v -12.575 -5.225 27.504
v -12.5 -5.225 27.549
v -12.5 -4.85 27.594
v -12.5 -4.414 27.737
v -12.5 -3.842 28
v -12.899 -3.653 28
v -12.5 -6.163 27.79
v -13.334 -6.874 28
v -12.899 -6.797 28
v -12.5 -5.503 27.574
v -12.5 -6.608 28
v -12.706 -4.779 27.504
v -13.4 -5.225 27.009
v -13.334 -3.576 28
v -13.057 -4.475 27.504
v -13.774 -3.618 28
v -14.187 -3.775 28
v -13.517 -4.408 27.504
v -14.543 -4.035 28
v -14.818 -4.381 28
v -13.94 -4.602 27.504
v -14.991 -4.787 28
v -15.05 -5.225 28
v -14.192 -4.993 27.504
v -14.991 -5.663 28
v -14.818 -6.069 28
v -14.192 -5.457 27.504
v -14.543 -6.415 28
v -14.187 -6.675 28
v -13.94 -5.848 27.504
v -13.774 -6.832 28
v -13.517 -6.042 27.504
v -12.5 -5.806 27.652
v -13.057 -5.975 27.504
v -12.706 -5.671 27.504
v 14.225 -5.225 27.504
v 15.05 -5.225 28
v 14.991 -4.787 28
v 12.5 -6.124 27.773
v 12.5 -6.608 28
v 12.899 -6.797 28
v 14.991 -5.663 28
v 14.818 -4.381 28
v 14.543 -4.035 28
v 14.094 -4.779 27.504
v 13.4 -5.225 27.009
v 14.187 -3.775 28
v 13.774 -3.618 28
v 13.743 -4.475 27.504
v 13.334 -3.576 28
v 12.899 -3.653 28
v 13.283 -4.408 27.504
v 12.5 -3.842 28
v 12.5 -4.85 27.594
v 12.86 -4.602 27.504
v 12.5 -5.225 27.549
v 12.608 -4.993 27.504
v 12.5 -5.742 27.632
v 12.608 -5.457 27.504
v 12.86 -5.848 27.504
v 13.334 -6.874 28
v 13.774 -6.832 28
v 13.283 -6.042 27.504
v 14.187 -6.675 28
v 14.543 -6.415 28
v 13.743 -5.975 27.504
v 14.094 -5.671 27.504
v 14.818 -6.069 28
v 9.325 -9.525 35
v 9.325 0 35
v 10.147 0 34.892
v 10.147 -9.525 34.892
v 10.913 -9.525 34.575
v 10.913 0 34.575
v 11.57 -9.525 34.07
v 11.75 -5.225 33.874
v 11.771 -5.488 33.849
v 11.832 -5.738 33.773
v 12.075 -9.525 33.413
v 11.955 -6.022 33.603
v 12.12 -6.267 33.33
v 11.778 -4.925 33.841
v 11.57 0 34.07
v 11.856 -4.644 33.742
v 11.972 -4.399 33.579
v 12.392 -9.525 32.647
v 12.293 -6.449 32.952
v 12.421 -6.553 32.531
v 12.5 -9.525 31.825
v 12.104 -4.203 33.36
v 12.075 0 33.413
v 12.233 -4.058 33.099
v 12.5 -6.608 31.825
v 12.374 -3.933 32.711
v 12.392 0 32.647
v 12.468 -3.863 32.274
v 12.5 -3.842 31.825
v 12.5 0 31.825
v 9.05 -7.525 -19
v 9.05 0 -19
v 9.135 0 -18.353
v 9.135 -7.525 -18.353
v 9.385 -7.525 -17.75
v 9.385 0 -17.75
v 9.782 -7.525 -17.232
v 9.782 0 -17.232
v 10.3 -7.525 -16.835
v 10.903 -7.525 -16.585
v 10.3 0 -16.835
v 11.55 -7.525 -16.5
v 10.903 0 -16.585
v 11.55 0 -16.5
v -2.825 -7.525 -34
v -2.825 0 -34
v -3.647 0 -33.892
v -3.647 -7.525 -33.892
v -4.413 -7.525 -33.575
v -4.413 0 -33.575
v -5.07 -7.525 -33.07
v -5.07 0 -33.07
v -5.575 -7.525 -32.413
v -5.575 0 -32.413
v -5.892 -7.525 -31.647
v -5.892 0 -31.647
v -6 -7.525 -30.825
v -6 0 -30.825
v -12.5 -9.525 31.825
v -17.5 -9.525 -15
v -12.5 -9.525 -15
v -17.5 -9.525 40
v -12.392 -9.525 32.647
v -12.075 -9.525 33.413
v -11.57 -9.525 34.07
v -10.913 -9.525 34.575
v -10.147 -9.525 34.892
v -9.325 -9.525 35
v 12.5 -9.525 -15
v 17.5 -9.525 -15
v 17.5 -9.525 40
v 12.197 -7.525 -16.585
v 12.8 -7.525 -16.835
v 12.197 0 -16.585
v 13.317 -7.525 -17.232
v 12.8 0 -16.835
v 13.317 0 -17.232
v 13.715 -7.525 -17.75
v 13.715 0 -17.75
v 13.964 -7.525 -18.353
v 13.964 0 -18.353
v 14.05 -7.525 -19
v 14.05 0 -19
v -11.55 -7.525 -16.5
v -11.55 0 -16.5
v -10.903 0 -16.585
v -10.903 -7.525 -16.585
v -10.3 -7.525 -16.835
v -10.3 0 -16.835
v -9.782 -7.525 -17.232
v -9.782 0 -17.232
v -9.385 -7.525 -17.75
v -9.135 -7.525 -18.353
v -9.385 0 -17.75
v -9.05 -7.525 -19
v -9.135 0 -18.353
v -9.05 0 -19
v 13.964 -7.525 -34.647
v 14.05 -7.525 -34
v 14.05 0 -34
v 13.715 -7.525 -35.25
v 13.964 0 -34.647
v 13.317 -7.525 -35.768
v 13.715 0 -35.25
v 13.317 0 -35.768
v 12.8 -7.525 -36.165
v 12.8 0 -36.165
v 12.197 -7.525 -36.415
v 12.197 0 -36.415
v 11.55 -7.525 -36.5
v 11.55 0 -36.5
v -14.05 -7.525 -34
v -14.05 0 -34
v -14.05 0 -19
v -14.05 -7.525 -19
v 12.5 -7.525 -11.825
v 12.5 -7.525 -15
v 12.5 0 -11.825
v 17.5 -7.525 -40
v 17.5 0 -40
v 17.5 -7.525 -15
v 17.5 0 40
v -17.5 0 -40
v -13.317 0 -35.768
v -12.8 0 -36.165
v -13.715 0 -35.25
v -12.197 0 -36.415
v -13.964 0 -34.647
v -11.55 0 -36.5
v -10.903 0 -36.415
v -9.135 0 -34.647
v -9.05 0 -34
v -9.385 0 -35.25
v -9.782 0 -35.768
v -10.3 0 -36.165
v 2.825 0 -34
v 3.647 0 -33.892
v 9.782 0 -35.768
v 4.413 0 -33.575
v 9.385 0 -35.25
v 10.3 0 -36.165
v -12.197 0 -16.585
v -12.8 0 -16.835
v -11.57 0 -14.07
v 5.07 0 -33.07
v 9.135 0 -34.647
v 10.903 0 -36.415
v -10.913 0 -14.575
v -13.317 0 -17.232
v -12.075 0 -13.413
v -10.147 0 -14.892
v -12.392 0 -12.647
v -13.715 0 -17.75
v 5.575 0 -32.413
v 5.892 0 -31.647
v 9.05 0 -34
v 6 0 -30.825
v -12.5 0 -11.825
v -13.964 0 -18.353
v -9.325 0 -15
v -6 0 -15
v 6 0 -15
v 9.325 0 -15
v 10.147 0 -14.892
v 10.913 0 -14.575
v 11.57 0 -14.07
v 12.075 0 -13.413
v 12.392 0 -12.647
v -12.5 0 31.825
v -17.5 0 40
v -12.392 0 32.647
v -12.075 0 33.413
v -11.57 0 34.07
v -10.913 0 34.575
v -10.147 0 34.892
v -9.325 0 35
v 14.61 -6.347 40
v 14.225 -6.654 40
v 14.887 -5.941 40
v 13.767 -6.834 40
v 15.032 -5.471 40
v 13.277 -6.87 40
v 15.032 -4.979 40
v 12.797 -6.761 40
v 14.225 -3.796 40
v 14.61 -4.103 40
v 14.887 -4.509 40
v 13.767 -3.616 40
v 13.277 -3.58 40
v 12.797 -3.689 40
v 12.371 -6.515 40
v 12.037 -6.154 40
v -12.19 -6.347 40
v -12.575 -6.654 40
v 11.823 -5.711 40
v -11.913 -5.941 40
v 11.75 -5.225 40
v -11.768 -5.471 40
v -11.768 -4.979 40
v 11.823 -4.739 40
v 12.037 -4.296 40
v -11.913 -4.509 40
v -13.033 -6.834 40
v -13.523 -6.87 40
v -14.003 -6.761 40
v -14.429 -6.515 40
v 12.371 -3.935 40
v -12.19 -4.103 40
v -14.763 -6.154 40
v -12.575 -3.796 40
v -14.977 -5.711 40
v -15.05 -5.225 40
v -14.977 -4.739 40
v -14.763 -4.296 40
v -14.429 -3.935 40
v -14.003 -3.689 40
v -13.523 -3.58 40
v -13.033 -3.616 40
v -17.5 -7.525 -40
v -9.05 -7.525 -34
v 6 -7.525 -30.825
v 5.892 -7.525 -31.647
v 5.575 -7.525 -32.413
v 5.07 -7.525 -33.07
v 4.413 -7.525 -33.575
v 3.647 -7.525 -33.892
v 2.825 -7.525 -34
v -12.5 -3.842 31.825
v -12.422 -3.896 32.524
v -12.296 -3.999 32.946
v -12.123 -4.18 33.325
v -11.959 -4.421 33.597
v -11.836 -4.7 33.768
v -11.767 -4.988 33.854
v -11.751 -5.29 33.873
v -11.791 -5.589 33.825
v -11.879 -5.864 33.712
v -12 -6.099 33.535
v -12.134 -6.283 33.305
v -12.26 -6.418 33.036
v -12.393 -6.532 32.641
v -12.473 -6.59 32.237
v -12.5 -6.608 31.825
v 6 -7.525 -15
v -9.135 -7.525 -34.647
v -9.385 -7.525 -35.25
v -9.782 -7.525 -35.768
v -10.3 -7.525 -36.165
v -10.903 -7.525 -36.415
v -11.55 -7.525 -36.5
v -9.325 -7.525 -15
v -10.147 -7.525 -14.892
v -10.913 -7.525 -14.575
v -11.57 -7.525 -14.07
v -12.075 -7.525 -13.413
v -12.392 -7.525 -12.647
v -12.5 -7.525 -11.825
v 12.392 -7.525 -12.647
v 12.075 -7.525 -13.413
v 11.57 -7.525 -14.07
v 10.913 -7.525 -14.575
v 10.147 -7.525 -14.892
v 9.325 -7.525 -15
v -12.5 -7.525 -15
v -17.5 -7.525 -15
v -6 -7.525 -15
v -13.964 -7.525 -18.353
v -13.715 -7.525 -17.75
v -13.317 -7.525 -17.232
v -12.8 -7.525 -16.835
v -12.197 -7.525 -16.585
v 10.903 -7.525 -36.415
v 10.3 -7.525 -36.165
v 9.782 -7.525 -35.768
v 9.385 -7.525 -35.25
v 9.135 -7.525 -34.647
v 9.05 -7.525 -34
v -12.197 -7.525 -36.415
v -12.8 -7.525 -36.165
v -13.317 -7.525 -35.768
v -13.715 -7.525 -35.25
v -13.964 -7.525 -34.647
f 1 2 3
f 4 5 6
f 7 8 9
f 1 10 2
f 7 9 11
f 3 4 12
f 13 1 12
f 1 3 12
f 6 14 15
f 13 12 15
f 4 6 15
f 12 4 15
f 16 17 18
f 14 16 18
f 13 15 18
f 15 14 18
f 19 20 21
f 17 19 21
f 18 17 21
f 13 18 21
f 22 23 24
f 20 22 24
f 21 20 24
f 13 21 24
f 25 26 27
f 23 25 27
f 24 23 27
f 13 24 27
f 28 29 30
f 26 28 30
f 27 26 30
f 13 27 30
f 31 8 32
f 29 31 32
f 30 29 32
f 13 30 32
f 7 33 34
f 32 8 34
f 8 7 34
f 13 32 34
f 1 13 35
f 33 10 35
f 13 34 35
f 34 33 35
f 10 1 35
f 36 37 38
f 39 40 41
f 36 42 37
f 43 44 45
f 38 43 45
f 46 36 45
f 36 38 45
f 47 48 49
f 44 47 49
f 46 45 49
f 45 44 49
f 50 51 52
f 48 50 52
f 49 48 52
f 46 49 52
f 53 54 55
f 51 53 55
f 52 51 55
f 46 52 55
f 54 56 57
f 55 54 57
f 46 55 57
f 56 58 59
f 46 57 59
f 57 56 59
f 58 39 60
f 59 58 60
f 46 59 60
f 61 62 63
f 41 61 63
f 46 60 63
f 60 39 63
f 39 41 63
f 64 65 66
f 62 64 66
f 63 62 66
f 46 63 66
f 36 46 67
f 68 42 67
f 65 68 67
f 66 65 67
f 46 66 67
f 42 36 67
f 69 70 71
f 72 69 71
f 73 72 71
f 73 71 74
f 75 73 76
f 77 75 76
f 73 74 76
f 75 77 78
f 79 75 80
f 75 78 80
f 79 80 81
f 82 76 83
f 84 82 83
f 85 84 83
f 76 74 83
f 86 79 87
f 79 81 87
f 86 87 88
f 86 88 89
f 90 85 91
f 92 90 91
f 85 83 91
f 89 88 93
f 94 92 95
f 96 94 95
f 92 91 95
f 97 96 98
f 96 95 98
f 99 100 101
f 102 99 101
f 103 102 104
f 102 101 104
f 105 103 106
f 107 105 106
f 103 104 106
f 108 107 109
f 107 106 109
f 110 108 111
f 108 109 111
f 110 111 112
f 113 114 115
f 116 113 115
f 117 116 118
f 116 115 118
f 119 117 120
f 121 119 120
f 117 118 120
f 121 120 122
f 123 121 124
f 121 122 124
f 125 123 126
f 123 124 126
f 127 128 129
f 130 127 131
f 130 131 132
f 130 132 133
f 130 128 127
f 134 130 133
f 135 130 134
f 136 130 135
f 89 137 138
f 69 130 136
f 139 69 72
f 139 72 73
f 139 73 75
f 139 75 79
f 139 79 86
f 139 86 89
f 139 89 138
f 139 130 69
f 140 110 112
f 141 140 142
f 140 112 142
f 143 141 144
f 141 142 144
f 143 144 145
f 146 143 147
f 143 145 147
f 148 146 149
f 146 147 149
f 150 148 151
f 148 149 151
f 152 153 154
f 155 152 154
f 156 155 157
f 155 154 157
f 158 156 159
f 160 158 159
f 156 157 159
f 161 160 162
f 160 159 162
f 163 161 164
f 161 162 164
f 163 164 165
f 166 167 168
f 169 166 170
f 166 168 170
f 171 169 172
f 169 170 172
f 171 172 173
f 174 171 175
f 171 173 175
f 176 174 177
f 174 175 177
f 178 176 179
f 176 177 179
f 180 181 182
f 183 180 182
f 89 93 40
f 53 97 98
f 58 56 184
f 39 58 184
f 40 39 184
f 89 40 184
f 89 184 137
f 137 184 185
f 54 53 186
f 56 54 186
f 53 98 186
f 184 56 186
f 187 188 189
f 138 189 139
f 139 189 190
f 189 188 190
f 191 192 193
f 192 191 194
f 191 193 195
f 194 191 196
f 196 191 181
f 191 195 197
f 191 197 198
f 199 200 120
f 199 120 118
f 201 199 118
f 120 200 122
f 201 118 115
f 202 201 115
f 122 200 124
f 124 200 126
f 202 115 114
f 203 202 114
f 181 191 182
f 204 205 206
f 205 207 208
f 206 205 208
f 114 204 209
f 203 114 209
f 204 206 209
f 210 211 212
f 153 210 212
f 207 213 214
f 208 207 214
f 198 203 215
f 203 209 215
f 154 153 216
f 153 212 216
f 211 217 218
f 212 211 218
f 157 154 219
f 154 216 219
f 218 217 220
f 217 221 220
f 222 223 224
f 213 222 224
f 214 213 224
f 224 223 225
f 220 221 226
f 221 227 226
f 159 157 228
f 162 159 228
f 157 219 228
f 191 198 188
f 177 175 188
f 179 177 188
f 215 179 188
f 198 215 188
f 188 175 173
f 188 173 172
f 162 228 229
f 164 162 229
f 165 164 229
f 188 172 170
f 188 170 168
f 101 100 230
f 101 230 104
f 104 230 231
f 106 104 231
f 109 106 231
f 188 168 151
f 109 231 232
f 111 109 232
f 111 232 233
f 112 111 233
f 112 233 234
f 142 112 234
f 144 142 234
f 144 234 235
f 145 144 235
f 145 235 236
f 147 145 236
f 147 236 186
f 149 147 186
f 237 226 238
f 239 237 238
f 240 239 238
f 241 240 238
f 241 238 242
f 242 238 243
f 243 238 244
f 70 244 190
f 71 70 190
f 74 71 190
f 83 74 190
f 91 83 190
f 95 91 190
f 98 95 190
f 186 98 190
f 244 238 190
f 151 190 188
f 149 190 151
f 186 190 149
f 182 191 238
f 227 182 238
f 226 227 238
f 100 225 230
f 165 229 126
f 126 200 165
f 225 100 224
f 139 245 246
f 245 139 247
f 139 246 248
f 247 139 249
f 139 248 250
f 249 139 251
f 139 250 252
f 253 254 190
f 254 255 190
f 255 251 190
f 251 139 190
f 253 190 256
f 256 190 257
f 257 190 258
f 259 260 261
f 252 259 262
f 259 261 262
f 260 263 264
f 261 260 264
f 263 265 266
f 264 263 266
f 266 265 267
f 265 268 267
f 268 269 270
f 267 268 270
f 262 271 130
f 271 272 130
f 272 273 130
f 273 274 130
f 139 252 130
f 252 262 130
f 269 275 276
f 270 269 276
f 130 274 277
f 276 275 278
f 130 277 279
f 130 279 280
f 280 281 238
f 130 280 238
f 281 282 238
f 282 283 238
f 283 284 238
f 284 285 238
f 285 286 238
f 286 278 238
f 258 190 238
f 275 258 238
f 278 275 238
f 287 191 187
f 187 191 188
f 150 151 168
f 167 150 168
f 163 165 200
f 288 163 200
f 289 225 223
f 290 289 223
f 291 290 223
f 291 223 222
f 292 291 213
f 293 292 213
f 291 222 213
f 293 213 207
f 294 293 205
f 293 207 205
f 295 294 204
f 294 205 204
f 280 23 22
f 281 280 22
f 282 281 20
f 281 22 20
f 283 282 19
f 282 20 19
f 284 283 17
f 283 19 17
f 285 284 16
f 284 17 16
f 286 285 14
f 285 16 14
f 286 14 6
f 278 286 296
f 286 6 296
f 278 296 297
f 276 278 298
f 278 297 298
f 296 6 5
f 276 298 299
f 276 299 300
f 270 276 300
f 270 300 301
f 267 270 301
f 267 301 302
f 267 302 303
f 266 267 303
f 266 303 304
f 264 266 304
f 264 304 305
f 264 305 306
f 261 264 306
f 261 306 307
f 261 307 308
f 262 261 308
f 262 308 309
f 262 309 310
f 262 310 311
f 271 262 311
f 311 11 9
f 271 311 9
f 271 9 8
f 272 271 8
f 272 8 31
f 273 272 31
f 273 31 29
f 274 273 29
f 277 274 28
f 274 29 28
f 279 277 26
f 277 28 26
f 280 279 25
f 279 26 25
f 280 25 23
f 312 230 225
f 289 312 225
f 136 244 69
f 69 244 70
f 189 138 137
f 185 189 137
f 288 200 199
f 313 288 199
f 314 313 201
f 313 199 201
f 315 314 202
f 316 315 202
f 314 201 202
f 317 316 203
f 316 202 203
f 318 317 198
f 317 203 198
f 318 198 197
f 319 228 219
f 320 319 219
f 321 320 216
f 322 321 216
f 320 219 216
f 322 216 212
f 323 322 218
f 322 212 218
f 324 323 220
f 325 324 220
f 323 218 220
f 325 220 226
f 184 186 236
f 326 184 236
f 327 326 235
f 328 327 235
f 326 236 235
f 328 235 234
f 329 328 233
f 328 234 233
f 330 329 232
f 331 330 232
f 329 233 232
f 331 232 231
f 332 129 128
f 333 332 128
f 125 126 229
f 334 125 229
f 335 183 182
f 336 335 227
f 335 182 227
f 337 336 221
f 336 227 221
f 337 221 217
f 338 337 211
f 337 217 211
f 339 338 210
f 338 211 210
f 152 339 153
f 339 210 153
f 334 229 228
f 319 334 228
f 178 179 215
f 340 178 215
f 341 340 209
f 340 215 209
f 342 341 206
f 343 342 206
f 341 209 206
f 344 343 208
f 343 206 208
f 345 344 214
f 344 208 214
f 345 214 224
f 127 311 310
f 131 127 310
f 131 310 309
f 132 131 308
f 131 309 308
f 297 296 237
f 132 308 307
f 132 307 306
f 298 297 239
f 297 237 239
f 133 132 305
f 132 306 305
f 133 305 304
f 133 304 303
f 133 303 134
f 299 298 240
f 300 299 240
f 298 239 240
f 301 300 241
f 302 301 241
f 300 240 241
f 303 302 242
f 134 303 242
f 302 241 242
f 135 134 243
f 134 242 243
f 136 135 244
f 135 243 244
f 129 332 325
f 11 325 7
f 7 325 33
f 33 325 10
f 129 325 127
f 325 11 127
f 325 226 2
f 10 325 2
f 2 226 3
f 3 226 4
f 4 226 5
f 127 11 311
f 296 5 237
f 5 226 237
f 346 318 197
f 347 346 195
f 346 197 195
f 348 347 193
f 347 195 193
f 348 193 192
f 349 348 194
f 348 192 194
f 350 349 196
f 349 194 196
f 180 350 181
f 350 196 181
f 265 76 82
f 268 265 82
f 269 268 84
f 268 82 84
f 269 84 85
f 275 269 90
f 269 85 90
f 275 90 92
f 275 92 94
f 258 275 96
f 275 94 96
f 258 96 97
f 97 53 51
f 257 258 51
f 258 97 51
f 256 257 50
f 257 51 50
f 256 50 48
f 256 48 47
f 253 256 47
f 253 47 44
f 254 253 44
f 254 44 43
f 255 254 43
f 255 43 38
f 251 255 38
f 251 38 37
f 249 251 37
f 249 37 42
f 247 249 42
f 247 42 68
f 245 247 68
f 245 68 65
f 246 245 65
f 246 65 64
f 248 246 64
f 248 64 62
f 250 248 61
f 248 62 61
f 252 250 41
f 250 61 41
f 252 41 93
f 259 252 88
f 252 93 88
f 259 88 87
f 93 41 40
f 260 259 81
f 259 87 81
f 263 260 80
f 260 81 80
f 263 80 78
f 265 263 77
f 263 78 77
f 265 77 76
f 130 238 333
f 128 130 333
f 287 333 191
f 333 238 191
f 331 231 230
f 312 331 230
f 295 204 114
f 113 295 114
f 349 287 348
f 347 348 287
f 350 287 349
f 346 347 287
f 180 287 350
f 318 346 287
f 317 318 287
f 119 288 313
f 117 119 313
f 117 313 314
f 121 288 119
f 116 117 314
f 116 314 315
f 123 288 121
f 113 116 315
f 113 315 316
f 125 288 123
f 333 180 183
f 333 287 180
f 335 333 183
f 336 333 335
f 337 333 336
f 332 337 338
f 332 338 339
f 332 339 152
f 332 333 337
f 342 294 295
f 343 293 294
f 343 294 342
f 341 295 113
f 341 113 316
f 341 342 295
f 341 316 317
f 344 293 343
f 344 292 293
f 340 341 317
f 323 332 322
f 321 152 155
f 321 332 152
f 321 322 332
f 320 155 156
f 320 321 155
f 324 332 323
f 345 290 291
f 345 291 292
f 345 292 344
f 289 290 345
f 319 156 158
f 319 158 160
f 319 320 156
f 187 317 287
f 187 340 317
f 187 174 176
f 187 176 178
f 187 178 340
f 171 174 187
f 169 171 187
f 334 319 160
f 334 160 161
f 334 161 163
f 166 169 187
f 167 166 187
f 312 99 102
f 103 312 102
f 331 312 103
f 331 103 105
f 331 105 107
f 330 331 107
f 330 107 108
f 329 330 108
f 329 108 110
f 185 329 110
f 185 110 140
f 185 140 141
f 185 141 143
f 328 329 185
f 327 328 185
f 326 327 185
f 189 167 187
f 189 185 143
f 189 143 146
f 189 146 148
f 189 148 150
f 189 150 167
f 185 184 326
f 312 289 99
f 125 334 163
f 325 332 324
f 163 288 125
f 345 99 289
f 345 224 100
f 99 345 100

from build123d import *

# Parameters (mm, degrees)
F1_DEPTH = 9.525
F3_DEPTH = 2
F5_D     = 3.3
F5_DEPTH = 12
F5_TIP   = 0.9914200214
F7_DEPTH = 2


with BuildPart() as f1:
    # F0 (on Front) → F1 (new body)
    with BuildSketch(Plane.XZ):
        with BuildLine():
            Line((-17.5, -40), (17.5, -40))
            Line((17.5, -40), (17.5, -15))
            Line((17.5, -15), (9.325, -15))
            Line((9.325, -15), (6, -15))
            Line((6, -15), (6, -30.825))
            ThreePointArc((6, -30.825), (5.0700640303, -33.0700640303), (2.825, -34))
            Line((2.825, -34), (-2.825, -34))
            ThreePointArc((-2.825, -34), (-5.0700640303, -33.0700640303), (-6, -30.825))
            Line((-6, -30.825), (-6, -15))
            Line((-6, -15), (-9.325, -15))
            Line((-9.325, -15), (-17.5, -15))
            Line((-17.5, -15), (-17.5, -40))
        make_face()
        with BuildLine():
            Line((-9.0496408567, -19), (-9.0496408567, -34))
            ThreePointArc((-9.0496408567, -34), (-9.7818739037, -35.767766953), (-11.5496408567, -36.5))
            ThreePointArc((-11.5496408567, -36.5), (-13.3174078096, -35.767766953), (-14.0496408567, -34))
            Line((-14.0496408567, -34), (-14.0496408567, -19))
            ThreePointArc((-14.0496408567, -19), (-13.3174078096, -17.232233047), (-11.5496408567, -16.5))
            ThreePointArc((-11.5496408567, -16.5), (-9.7818739037, -17.232233047), (-9.0496408567, -19))
        make_face(mode=Mode.SUBTRACT)
        with BuildLine():
            ThreePointArc((11.5496408567, -36.5), (9.7818739037, -35.767766953), (9.0496408567, -34))
            Line((9.0496408567, -34), (9.0496408567, -19))
            ThreePointArc((9.0496408567, -19), (9.7818739037, -17.232233047), (11.5496408567, -16.5))
            ThreePointArc((11.5496408567, -16.5), (13.3174078096, -17.232233047), (14.0496408567, -19))
            Line((14.0496408567, -19), (14.0496408567, -34))
            ThreePointArc((14.0496408567, -34), (13.3174078096, -35.767766953), (11.5496408567, -36.5))
        make_face(mode=Mode.SUBTRACT)
        with BuildLine():
            Line((9.325, -15), (17.5, -15))
            Line((17.5, -15), (17.5, 40))
            Line((17.5, 40), (-17.5, 40))
            Line((-17.5, 40), (-17.5, -15))
            Line((-17.5, -15), (-9.325, -15))
            ThreePointArc((-9.325, -15), (-11.5700640303, -14.0700640303), (-12.5, -11.825))
            Line((-12.5, -11.825), (-12.5, 31.825))
            ThreePointArc((-12.5, 31.825), (-11.5700640303, 34.0700640303), (-9.325, 35))
            Line((-9.325, 35), (9.325, 35))
            ThreePointArc((9.325, 35), (11.5700640303, 34.0700640303), (12.5, 31.825))
            Line((12.5, 31.825), (12.5, -11.825))
            ThreePointArc((12.5, -11.825), (11.5700640303, -14.0700640303), (9.325, -15))
        make_face()
    extrude(amount=F1_DEPTH)

    # F2 (on face) → F3 (cut)
    with BuildSketch(Plane.XZ.offset(9.525)):
        with BuildLine():
            Line((-9.325, -15), (-17.5, -15))
            Line((-17.5, -15), (-17.5, -40))
            Line((-17.5, -40), (17.5, -40))
            Line((17.5, -40), (17.5, -15))
            Line((17.5, -15), (9.325, -15))
            Line((9.325, -15), (6, -15))
            Line((6, -15), (6, -30.825))
            ThreePointArc((6, -30.825), (5.0700640303, -33.0700640303), (2.825, -34))
            Line((2.825, -34), (-2.825, -34))
            ThreePointArc((-2.825, -34), (-5.0700640303, -33.0700640303), (-6, -30.825))
            Line((-6, -30.825), (-6, -15))
            Line((-6, -15), (-9.325, -15))
        make_face()
        with BuildLine():
            ThreePointArc((-14.0496408567, -19), (-11.5496408567, -16.5), (-9.0496408567, -19))
            Line((-9.0496408567, -19), (-9.0496408567, -34))
            ThreePointArc((-9.0496408567, -34), (-11.5496408567, -36.5), (-14.0496408567, -34))
            Line((-14.0496408567, -34), (-14.0496408567, -19))
        make_face(mode=Mode.SUBTRACT)
        with BuildLine():
            Line((14.0496408567, -19), (14.0496408567, -34))
            ThreePointArc((14.0496408567, -34), (11.5496408567, -36.5), (9.0496408567, -34))
            Line((9.0496408567, -34), (9.0496408567, -19))
            ThreePointArc((9.0496408567, -19), (11.5496408567, -16.5), (14.0496408567, -19))
        make_face(mode=Mode.SUBTRACT)
    extrude(amount=-F3_DEPTH, mode=Mode.SUBTRACT)

    # F5
    with Locations(Plane.XY.offset(40)):
        with Locations((-13.4, -5.225), (13.4, -5.225)):
            Hole(F5_D / 2, depth=F5_DEPTH)
            with Locations((0, 0, -(F5_DEPTH + F5_TIP / 2))):  # 118° drill point
                Cone(0, F5_D / 2, F5_TIP, mode=Mode.SUBTRACT)

    # F6 (on face) → F7 (cut, through all)
    with BuildSketch(Plane.XZ.offset(9.525)):
        with BuildLine():
            ThreePointArc((-9.325, -15), (-11.5700640303, -14.0700640303), (-12.5, -11.825))
            Line((-12.5, -11.825), (-12.5, -15))
            Line((-12.5, -15), (-9.325, -15))
        make_face()
        with BuildLine():
            Line((12.5, -15), (12.5, -11.825))
            ThreePointArc((12.5, -11.825), (11.5700640303, -14.0700640303), (9.325, -15))
            Line((9.325, -15), (12.5, -15))
        make_face()
    extrude(amount=-F7_DEPTH, mode=Mode.SUBTRACT)


solid = f1.part
